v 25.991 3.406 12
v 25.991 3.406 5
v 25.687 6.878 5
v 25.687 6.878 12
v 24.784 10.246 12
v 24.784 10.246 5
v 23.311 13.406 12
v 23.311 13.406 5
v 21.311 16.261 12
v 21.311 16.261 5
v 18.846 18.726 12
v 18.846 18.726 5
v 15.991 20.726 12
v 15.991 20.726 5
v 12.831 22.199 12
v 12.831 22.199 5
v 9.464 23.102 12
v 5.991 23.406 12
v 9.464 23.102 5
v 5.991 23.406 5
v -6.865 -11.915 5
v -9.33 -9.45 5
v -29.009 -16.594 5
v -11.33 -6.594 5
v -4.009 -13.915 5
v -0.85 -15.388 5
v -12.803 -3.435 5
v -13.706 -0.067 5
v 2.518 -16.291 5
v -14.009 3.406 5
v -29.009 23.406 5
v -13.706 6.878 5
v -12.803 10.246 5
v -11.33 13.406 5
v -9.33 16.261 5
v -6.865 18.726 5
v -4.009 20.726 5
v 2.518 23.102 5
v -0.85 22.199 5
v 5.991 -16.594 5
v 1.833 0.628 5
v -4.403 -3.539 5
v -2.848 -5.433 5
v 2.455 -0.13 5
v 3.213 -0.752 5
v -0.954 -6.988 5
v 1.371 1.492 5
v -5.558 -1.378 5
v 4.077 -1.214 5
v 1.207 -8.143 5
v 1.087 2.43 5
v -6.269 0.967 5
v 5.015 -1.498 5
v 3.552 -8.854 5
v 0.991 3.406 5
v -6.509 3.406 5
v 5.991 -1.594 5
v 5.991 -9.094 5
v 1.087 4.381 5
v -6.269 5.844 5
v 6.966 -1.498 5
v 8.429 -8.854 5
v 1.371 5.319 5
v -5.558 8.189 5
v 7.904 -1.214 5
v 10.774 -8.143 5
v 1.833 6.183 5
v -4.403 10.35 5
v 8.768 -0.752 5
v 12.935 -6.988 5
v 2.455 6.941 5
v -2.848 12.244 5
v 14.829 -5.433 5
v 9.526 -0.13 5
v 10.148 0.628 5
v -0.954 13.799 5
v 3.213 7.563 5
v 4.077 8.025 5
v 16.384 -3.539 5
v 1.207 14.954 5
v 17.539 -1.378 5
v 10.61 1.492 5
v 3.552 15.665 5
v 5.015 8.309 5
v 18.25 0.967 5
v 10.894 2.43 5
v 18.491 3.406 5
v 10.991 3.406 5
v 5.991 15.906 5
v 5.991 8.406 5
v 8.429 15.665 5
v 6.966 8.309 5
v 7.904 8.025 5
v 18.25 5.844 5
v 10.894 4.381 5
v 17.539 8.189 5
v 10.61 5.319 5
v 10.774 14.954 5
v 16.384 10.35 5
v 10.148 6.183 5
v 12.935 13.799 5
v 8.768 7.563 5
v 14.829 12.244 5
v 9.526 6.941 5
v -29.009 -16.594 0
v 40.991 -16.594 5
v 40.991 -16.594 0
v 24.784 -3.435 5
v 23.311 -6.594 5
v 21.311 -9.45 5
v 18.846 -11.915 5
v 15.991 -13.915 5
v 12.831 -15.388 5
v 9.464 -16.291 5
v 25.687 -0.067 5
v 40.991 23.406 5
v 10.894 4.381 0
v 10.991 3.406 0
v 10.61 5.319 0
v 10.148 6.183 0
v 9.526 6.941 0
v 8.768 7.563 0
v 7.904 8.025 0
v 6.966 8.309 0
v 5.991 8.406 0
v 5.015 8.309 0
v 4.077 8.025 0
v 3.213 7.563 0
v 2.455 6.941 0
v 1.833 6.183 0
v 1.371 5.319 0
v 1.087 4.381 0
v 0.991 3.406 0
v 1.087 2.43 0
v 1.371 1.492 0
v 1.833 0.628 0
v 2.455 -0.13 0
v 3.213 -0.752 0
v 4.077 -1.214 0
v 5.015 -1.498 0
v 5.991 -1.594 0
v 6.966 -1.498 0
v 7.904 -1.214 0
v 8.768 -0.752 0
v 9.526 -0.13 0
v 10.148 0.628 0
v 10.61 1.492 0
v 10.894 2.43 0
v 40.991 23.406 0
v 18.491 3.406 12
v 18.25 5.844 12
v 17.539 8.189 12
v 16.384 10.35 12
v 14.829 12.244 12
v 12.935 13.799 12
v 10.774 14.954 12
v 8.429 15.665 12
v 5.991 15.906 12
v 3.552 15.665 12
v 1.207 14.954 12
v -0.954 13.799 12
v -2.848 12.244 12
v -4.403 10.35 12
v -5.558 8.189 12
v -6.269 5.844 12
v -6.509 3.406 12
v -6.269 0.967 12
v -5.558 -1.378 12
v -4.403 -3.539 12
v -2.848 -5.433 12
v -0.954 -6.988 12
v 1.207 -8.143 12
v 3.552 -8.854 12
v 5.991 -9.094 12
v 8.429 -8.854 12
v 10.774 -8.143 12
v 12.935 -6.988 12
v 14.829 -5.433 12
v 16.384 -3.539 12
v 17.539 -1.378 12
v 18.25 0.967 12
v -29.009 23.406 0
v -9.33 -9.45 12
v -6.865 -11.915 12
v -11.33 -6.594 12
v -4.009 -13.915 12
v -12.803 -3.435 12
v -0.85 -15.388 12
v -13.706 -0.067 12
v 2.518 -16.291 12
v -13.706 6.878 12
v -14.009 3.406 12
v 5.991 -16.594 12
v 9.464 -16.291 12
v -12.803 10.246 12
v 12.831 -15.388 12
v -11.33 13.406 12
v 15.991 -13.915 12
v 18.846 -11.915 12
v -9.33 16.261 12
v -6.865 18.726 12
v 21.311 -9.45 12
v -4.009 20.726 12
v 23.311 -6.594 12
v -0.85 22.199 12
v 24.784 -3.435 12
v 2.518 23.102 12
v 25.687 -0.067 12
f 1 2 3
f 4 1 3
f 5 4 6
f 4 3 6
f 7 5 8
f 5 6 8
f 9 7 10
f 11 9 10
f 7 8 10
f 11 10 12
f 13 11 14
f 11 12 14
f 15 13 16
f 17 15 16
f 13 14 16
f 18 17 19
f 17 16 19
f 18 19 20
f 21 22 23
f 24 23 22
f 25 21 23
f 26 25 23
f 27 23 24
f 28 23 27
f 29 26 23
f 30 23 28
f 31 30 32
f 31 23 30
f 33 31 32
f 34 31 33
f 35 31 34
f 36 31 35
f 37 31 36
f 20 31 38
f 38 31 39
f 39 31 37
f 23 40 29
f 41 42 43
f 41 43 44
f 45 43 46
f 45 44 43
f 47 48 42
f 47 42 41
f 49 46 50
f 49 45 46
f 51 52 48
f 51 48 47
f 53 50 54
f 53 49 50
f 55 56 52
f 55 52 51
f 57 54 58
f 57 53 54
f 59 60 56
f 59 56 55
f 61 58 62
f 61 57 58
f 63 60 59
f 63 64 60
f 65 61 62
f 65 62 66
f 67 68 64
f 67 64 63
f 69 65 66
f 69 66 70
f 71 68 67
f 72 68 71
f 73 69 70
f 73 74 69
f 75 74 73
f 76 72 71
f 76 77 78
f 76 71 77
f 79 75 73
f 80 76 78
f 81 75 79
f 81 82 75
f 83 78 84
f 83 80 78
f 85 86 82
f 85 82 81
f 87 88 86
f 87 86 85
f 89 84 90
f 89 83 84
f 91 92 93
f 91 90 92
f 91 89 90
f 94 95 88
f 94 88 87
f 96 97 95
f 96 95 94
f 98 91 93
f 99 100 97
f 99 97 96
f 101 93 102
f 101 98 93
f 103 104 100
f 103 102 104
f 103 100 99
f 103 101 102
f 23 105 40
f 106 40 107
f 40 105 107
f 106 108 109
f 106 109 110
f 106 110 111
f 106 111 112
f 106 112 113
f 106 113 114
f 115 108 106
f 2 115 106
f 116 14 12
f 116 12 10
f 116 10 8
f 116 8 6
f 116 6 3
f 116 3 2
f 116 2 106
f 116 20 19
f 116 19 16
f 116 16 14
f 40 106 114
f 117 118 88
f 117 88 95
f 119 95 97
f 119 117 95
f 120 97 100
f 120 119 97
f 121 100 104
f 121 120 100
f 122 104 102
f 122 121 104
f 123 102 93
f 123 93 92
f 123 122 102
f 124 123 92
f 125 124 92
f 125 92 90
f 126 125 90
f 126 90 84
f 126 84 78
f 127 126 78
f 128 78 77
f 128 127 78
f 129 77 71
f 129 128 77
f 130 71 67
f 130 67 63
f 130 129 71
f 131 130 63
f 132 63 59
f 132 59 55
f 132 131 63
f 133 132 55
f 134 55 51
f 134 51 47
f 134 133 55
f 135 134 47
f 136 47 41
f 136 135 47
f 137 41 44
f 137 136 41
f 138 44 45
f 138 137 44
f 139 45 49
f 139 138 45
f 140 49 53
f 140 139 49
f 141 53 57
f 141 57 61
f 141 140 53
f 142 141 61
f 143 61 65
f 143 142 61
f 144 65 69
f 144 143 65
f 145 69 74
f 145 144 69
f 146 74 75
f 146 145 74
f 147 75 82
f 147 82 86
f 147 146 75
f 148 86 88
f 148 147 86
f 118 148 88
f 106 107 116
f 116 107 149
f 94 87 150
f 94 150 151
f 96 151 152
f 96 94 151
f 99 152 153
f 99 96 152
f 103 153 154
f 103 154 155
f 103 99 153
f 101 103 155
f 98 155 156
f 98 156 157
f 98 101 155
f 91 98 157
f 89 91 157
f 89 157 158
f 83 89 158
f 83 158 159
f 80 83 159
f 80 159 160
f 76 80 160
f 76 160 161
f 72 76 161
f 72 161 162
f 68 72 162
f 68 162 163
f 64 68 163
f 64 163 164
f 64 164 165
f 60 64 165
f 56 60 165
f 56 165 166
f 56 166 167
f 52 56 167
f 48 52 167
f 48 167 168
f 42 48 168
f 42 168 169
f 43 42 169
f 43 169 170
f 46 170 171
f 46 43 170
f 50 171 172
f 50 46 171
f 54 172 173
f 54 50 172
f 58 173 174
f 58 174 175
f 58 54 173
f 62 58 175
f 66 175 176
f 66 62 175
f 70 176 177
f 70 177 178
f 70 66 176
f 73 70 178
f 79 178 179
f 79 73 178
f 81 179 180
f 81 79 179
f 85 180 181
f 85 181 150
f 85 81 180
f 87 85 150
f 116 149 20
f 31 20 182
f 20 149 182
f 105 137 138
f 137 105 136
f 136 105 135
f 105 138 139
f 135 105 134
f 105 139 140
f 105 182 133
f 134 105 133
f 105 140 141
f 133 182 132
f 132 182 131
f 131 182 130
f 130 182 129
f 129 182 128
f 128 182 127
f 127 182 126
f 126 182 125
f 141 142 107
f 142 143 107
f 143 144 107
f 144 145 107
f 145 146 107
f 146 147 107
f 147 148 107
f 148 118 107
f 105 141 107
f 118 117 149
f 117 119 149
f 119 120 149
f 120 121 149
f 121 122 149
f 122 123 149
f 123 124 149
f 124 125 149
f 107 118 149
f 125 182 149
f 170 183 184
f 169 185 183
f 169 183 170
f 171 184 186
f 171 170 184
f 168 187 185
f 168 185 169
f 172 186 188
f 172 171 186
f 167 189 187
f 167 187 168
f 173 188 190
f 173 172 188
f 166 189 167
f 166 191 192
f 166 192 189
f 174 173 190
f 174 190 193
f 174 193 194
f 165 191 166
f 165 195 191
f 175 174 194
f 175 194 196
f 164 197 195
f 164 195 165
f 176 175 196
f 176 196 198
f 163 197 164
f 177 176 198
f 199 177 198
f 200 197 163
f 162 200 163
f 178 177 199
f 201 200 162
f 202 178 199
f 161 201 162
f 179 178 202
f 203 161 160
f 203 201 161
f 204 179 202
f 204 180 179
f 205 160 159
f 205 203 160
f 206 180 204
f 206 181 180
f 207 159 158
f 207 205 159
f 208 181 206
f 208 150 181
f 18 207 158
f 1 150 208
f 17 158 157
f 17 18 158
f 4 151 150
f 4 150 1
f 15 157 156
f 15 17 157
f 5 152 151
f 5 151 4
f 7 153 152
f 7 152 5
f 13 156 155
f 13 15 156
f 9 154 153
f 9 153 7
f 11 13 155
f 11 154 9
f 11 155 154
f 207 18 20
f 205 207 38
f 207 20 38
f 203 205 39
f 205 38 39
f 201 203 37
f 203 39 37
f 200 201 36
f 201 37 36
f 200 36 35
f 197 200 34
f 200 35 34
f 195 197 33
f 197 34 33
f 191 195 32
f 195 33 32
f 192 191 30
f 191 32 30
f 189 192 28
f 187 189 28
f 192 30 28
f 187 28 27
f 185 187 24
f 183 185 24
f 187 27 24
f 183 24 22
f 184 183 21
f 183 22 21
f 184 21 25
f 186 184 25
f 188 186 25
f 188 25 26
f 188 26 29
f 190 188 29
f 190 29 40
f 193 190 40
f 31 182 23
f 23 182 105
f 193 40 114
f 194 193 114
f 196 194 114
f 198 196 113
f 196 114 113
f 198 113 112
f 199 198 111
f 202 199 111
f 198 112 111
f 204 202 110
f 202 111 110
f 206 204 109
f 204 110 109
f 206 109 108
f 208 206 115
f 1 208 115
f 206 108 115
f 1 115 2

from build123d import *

# Parameters (mm, degrees)
F0_R     = 12.5
F0_R_2   = 5
F1_DEPTH = 5
F2_DEPTH = 12
F3_DEPTH = 5


with BuildPart() as f1:
    # F0 (on Top) → F1 (new body)
    with BuildSketch(Plane.XY):
        with Locations((5.99056, 3.405503)):
            Circle(F0_R)
        with Locations((5.99056, 3.405503)):
            Circle(F0_R_2, mode=Mode.SUBTRACT)
    extrude(amount=F1_DEPTH)

    # F0 (on Top) → F2 (join)
    with BuildSketch(Plane.XY):
        with BuildLine():
            ThreePointArc((25.99056, 3.405503), (20.132696, 17.547638), (5.99056, 23.405503))
            ThreePointArc((5.99056, 23.405503), (-14.00944, 3.405503), (5.99056, -16.594497))
            ThreePointArc((5.99056, -16.594497), (20.132696, -10.736633), (25.99056, 3.405503))
        make_face()
        with Locations((5.99056, 3.405503)):
            Circle(F0_R, mode=Mode.SUBTRACT)
    extrude(amount=F2_DEPTH)

    # F0 (on Top) → F3 (join)
    with BuildSketch(Plane.XY):
        with BuildLine():
            Line((40.99056, 23.405503), (5.99056, 23.405503))
            ThreePointArc((5.99056, 23.405503), (20.132696, 17.547638), (25.99056, 3.405503))
            ThreePointArc((25.99056, 3.405503), (20.132696, -10.736633), (5.99056, -16.594497))
            Line((5.99056, -16.594497), (40.99056, -16.594497))
            Line((40.99056, -16.594497), (40.99056, 23.405503))
        make_face()
        with BuildLine():
            Line((5.99056, 23.405503), (-29.00944, 23.405503))
            Line((-29.00944, 23.405503), (-29.00944, -16.594497))
            Line((-29.00944, -16.594497), (5.99056, -16.594497))
            ThreePointArc((5.99056, -16.594497), (-14.00944, 3.405503), (5.99056, 23.405503))
        make_face()
    extrude(amount=F3_DEPTH)


solid = f1.part
